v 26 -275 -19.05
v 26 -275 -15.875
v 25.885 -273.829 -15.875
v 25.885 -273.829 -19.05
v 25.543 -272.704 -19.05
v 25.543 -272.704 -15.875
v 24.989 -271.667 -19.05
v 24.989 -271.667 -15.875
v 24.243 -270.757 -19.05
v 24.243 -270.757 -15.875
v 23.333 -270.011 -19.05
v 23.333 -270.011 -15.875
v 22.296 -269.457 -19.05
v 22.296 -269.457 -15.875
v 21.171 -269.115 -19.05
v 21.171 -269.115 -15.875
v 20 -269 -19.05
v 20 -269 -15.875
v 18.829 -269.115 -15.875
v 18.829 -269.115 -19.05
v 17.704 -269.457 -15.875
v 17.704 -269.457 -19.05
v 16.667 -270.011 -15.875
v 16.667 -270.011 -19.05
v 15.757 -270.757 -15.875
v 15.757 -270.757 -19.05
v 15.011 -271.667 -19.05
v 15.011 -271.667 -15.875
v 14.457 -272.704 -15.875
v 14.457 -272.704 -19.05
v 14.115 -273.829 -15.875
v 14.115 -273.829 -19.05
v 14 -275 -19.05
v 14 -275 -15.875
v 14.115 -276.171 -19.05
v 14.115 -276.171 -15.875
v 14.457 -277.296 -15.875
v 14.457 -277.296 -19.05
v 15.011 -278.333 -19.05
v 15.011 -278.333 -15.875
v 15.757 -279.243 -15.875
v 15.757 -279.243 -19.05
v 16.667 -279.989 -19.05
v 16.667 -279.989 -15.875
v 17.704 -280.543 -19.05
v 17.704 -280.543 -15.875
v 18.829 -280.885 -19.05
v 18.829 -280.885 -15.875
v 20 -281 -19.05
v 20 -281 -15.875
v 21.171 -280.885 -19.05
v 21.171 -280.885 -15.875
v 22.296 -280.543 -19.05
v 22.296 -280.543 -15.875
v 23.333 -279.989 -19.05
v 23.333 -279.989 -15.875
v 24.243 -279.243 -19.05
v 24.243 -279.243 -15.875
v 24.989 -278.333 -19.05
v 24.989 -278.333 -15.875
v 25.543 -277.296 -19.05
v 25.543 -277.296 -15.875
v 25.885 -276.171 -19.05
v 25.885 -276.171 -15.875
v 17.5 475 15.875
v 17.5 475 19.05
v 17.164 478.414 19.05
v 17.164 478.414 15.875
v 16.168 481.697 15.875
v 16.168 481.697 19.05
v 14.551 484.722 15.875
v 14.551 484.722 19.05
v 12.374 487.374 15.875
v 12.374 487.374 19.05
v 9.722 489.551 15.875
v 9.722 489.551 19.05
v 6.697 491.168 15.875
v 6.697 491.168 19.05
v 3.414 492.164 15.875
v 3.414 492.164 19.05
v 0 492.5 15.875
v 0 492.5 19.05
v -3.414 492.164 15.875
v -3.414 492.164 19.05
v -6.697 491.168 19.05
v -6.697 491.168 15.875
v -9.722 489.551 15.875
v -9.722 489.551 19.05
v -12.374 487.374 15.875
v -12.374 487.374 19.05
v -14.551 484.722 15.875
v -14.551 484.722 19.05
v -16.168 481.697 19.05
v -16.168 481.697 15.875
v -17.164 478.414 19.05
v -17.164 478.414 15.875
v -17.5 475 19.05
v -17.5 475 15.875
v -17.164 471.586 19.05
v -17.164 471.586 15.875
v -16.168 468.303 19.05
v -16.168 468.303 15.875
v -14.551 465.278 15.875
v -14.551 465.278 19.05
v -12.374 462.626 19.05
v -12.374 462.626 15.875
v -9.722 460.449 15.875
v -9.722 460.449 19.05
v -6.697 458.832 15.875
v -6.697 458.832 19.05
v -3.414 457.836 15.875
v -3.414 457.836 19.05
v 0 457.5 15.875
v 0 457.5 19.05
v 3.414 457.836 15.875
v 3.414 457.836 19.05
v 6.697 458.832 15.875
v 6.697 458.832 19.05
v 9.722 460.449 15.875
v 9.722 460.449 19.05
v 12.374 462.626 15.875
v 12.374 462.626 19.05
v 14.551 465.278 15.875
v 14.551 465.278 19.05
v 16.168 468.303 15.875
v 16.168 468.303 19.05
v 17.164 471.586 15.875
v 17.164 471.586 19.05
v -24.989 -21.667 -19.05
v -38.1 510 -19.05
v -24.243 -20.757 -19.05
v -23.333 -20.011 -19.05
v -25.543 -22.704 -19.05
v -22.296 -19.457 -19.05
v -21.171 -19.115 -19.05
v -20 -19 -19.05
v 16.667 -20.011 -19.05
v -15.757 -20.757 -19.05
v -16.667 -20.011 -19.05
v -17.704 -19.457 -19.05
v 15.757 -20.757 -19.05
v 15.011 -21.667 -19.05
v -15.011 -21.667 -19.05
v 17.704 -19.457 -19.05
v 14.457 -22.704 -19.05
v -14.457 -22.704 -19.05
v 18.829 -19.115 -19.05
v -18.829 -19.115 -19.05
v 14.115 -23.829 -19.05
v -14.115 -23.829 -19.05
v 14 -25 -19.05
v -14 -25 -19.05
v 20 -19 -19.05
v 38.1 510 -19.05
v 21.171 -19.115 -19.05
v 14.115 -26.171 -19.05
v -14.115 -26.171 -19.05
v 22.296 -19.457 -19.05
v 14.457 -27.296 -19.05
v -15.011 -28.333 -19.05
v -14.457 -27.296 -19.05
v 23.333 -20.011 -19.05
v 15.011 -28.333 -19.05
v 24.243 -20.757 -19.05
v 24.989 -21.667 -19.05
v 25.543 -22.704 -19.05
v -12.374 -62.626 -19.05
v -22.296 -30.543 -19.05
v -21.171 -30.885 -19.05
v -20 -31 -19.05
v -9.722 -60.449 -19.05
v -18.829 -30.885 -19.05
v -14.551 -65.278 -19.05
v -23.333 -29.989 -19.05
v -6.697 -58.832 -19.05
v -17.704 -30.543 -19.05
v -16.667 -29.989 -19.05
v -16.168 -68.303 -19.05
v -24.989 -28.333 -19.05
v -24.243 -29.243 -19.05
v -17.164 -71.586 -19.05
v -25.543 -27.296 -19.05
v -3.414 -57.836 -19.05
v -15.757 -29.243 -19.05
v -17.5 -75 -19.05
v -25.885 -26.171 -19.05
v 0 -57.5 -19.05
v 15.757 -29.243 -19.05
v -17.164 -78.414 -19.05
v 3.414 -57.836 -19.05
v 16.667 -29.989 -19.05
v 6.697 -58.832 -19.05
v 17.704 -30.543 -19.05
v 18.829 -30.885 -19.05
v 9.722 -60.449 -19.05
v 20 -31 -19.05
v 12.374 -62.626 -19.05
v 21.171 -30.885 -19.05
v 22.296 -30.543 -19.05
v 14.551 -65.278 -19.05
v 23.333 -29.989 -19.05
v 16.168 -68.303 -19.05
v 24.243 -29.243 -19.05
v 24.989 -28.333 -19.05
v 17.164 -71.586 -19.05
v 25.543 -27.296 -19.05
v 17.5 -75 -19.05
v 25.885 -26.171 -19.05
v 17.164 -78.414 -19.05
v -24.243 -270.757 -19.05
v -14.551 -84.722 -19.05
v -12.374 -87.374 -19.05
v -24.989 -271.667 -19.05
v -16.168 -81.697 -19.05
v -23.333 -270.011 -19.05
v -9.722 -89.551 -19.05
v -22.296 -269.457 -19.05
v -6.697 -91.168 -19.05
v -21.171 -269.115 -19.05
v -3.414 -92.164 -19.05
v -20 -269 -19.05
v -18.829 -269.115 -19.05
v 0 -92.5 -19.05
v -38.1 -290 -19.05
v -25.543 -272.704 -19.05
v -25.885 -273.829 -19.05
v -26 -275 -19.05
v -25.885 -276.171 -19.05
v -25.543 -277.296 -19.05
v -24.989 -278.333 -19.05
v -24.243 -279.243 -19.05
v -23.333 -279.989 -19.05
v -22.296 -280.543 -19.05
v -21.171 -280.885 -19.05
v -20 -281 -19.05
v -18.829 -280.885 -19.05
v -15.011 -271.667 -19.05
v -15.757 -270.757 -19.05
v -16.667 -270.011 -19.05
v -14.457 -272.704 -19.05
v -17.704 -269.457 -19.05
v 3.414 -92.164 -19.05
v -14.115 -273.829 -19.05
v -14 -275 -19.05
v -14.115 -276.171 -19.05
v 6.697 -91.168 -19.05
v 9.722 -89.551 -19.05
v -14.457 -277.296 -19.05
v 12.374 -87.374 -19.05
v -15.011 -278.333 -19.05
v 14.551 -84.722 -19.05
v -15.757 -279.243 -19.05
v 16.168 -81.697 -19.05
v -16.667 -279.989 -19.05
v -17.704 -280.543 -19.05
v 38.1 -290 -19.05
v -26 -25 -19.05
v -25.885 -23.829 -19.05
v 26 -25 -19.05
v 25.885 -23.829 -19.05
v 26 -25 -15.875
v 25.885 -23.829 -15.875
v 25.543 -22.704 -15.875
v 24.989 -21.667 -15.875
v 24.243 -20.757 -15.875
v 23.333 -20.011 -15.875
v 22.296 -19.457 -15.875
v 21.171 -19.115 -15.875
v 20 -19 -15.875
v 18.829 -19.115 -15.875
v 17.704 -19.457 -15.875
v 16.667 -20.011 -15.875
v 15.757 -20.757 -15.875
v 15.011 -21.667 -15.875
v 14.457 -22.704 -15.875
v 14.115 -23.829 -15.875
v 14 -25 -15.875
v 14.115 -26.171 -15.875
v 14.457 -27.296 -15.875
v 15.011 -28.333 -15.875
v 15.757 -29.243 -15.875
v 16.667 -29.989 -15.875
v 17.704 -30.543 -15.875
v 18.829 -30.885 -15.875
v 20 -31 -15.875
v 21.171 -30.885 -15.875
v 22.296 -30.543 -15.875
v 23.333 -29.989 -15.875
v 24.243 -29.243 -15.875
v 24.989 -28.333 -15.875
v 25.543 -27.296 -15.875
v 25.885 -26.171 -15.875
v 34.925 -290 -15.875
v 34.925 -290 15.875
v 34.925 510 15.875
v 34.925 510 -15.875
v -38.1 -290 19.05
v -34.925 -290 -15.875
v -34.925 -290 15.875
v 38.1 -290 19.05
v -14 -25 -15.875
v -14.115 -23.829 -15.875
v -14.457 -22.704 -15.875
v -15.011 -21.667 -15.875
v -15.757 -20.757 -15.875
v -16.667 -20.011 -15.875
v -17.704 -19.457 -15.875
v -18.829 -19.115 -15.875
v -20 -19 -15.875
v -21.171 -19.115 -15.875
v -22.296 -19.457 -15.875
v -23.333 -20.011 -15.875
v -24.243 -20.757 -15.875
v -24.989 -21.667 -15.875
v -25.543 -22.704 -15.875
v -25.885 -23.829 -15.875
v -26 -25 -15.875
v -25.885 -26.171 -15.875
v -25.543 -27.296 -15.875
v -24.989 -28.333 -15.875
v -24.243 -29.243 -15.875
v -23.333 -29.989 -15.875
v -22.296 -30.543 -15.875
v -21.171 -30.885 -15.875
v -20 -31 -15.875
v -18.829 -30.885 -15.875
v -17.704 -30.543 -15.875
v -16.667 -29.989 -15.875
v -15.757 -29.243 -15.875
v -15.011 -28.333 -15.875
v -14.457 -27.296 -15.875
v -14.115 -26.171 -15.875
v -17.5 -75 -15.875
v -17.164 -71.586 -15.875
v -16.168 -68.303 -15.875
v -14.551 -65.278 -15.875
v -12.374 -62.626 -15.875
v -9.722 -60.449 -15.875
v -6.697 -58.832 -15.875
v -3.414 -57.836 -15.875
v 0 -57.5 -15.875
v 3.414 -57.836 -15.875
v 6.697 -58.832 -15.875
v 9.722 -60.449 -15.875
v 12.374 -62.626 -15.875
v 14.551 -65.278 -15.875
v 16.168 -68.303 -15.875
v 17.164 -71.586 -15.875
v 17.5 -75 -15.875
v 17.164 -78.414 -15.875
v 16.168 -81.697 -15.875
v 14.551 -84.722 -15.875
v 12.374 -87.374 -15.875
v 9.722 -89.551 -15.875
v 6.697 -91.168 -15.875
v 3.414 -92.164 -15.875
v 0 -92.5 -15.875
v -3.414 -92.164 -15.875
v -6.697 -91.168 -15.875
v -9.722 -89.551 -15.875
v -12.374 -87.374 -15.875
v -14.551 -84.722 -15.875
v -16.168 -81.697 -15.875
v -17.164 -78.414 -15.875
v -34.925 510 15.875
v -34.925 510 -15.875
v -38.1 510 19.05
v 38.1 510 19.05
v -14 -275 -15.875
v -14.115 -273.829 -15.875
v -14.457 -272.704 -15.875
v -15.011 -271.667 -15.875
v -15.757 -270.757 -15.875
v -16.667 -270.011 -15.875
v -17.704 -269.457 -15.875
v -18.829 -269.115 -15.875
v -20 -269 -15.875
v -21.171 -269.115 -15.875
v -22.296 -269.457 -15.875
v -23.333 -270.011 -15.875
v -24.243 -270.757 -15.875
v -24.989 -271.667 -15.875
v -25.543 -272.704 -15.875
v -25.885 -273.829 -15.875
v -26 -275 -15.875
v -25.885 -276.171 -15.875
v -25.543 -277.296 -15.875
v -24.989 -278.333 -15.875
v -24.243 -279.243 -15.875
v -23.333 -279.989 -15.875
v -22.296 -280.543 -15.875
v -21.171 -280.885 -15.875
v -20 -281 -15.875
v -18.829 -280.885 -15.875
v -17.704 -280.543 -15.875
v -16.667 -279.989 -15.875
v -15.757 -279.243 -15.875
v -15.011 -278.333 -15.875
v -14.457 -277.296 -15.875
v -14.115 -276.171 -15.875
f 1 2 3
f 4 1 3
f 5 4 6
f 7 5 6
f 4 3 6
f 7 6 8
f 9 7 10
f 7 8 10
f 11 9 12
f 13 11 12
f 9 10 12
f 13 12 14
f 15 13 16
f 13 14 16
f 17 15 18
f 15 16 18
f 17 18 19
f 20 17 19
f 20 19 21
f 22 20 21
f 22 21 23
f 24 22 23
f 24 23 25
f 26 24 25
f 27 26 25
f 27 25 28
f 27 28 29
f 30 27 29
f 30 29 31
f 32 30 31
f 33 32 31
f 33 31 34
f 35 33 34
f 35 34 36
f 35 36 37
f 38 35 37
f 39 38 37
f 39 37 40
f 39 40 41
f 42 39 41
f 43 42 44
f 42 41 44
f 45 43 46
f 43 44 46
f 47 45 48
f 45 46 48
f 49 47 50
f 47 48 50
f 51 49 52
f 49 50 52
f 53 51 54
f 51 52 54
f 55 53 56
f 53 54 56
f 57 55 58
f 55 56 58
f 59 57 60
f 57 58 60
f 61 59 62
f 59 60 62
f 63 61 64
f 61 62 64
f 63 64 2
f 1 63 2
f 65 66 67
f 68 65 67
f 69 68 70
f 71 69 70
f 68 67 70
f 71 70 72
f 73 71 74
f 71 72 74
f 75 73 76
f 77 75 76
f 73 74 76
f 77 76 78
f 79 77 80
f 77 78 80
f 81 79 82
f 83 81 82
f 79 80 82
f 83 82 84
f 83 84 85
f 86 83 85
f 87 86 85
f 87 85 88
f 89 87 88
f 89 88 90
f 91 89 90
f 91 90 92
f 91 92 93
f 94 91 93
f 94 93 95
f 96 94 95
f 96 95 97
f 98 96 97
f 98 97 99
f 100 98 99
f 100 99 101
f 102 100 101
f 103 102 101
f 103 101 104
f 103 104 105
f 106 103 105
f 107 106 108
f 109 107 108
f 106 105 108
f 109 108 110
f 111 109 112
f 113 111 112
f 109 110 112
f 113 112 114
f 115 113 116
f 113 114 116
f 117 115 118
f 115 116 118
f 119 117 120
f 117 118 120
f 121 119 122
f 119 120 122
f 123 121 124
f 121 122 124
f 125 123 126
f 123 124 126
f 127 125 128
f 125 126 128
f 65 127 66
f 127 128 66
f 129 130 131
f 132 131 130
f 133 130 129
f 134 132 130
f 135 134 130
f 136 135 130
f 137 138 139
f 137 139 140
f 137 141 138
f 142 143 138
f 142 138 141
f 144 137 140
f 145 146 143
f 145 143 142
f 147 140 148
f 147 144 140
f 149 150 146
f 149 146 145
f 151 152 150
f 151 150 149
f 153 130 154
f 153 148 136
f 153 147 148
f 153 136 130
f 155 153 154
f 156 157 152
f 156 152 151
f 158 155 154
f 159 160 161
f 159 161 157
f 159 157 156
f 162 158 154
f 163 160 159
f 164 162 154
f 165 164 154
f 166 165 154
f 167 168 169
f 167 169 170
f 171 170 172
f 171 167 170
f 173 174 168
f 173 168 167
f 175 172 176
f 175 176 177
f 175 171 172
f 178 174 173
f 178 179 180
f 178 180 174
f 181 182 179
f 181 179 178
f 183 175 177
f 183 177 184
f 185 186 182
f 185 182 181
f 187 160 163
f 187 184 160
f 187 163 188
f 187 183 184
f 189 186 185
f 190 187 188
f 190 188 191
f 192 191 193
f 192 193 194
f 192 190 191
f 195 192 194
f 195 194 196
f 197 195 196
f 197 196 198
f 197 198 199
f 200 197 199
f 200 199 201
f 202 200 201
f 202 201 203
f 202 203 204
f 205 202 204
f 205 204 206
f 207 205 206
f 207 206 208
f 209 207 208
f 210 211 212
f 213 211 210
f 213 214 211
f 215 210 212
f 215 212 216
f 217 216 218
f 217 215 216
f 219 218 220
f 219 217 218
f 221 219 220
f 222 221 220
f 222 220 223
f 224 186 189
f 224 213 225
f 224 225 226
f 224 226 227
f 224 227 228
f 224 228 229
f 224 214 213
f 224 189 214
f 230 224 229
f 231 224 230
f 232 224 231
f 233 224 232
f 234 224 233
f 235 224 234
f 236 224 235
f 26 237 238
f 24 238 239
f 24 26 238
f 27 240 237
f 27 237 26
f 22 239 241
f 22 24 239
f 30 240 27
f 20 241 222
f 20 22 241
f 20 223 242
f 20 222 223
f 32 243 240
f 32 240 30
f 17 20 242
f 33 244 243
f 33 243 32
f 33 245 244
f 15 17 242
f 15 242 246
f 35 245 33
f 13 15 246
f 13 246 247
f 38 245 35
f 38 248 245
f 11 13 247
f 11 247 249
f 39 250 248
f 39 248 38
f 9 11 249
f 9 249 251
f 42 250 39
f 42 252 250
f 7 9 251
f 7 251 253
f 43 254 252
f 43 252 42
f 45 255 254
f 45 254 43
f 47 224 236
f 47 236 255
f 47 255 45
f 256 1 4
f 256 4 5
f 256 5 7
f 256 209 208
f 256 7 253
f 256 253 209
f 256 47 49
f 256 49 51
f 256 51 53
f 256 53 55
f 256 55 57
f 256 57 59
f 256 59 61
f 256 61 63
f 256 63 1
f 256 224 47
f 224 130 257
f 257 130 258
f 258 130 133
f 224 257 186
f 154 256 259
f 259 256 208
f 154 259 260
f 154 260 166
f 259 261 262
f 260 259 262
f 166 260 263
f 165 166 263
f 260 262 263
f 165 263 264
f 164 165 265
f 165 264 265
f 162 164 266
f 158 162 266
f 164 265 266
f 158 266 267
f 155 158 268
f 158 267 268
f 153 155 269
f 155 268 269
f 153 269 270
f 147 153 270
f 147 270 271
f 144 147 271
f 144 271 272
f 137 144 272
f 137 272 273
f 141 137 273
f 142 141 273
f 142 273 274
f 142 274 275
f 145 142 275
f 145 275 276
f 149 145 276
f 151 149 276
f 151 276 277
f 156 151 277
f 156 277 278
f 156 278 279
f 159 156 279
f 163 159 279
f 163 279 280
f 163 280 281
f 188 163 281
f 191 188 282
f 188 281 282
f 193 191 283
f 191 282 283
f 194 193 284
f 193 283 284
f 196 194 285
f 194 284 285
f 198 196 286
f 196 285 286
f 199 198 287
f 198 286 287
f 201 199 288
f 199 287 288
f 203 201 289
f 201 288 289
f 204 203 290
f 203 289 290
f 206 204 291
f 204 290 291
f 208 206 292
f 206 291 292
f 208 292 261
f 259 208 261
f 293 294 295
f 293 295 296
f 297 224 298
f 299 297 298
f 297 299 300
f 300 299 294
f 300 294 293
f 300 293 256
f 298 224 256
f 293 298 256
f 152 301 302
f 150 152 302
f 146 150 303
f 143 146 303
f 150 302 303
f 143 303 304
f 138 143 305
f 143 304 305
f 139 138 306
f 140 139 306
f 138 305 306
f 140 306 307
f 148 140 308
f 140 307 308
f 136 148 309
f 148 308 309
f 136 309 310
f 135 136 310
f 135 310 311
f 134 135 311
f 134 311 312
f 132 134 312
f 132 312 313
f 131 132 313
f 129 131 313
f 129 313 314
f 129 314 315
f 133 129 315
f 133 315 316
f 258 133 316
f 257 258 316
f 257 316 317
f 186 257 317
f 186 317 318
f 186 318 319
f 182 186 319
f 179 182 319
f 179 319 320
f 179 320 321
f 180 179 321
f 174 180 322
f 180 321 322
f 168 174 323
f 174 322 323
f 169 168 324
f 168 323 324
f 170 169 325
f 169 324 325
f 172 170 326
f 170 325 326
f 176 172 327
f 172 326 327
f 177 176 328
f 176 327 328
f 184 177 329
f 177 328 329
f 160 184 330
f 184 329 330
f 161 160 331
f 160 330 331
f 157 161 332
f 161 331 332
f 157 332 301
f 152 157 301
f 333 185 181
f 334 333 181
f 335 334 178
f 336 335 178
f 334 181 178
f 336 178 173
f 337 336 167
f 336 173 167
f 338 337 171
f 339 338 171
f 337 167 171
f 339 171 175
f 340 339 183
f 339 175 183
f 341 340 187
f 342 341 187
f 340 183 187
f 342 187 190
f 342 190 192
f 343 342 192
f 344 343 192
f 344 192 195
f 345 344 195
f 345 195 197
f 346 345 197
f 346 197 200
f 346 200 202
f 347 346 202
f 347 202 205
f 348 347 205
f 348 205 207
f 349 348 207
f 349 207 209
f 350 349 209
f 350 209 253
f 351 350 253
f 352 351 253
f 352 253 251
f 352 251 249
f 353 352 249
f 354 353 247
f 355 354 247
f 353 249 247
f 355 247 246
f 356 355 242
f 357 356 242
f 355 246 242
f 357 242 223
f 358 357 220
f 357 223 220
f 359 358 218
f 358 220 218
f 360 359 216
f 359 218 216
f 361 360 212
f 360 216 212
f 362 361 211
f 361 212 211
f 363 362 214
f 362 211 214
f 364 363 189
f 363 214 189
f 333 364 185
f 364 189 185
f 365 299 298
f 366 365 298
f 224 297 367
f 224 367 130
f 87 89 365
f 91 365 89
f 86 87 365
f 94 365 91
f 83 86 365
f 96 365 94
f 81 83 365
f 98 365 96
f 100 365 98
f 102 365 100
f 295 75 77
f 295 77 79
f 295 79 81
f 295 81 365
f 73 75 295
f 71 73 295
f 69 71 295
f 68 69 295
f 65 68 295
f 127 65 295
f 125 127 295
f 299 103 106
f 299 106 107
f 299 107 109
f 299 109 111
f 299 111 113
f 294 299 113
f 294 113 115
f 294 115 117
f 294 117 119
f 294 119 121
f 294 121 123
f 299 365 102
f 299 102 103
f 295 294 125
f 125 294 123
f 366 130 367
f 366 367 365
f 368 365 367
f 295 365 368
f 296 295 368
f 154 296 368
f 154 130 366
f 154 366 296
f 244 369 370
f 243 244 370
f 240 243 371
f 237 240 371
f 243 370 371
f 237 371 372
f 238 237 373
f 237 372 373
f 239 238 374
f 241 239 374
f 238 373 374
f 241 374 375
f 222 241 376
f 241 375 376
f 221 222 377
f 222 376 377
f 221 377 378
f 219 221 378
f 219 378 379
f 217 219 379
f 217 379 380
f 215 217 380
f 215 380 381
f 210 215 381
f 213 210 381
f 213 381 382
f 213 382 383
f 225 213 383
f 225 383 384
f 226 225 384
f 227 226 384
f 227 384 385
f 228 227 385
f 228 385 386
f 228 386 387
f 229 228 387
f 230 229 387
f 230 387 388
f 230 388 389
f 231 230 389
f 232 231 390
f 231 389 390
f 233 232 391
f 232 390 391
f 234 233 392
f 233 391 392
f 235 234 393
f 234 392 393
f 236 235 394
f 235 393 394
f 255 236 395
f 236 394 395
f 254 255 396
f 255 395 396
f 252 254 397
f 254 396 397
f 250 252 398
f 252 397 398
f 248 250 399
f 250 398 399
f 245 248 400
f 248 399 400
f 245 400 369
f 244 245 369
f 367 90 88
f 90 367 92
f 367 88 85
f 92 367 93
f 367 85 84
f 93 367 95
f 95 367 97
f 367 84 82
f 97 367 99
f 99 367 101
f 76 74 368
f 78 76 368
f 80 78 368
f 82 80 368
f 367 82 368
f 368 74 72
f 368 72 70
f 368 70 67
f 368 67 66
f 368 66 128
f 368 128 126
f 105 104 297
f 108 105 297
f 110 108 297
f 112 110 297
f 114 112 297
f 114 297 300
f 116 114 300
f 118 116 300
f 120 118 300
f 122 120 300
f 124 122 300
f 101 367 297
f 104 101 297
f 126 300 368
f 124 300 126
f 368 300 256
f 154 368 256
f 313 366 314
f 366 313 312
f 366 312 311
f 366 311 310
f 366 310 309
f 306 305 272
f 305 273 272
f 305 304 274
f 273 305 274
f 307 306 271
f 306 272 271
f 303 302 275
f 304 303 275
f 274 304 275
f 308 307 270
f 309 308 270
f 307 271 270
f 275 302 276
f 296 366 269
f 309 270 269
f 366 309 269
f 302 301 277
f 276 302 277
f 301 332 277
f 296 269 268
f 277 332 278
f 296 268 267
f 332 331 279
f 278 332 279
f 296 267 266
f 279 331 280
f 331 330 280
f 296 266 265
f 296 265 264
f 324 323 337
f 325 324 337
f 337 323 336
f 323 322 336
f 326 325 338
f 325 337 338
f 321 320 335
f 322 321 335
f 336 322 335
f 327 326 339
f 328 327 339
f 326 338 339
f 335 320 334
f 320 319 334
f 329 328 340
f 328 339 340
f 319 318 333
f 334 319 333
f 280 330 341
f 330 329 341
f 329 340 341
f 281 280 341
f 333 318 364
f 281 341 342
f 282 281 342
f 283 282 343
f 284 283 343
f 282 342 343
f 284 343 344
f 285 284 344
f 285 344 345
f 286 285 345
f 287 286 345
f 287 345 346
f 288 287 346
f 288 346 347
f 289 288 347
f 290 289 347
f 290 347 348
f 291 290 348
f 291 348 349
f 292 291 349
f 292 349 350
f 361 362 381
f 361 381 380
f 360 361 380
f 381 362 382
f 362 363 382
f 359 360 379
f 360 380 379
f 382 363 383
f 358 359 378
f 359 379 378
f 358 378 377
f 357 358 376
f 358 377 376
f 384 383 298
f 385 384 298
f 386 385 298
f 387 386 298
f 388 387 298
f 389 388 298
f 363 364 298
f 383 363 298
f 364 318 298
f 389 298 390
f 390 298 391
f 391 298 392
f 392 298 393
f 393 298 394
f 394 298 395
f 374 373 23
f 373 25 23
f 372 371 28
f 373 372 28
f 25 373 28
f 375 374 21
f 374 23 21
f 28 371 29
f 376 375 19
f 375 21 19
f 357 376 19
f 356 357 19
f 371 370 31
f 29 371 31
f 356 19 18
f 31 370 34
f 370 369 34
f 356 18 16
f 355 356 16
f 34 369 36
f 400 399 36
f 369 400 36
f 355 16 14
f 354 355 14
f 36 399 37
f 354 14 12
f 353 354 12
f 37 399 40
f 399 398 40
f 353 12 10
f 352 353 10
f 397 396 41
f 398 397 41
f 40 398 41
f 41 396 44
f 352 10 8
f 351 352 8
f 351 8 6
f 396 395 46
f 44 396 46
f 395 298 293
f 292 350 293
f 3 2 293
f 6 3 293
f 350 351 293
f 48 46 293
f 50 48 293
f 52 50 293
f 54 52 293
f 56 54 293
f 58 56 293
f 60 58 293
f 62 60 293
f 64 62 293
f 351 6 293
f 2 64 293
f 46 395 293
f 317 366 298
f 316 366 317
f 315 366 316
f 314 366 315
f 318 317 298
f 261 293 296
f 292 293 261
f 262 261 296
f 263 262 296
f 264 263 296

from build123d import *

# Parameters (mm, degrees)
EXTRUDE_THIN1_DEPTH            = 510
EXTRUDE_THIN1_DEPTH_BACK       = 290
SKETCH1_W                      = 76.2
SKETCH1_H                      = 38.1
SKETCH1_W_2                    = 69.85
SKETCH1_H_2                    = 31.75
F_12_0_12_DIAMETER_HOLE1_D     = 12
F_12_0_12_DIAMETER_HOLE1_DEPTH = 3.175
CUT_EXTRUDE1_REACH             = 514.838
SKETCH6_R                      = 17.5
CUT_EXTRUDE2_REACH             = 514.838
SKETCH7_R                      = 17.5


with BuildPart() as part:
    # Sketch1 → Extrude-Thin1 (new, two sides: drawn at the far end of the back side and taken through both)
    with BuildSketch(Plane(origin=(0, 0, 0), x_dir=(1, 0, 0), z_dir=(0, 1, 0)).offset(-EXTRUDE_THIN1_DEPTH_BACK)):
        Rectangle(SKETCH1_W, SKETCH1_H)
        Rectangle(SKETCH1_W_2, SKETCH1_H_2, mode=Mode.SUBTRACT)
    extrude(amount=EXTRUDE_THIN1_DEPTH + EXTRUDE_THIN1_DEPTH_BACK)

    # Ø12.0 (12) Diameter Hole1
    with Locations(Plane(origin=(0, 0, -19.05), x_dir=(-1, 0, 0), z_dir=(0, 0, -1))):
        with Locations((-20, -25), (20, -275), (-20, -275), (20, -25)):
            Hole(F_12_0_12_DIAMETER_HOLE1_D / 2, depth=F_12_0_12_DIAMETER_HOLE1_DEPTH)

    # Sketch6 → Cut-Extrude1 (cut, up to next)
    with BuildSketch(Plane.XY.offset(19.05), mode=Mode.PRIVATE) as cut_extrude1_sk1:
        with Locations((0, 475)):
            Circle(SKETCH6_R)
    cut_extrude1_tool1 = extrude(cut_extrude1_sk1.sketch, amount=-CUT_EXTRUDE1_REACH, mode=Mode.PRIVATE) & part.part
    add(cut_extrude1_tool1.solids().sort_by_distance((0, 475, 19.05))[0], mode=Mode.SUBTRACT)

    # Sketch7 → Cut-Extrude2 (cut, up to next)
    with BuildSketch(Plane(origin=(0, 0, -19.05), x_dir=(-1, 0, 0), z_dir=(0, 0, -1)), mode=Mode.PRIVATE) as cut_extrude2_sk1:
        with Locations((0, -75)):
            Circle(SKETCH7_R)
    cut_extrude2_tool1 = extrude(cut_extrude2_sk1.sketch, amount=-CUT_EXTRUDE2_REACH, mode=Mode.PRIVATE) & part.part
    add(cut_extrude2_tool1.solids().sort_by_distance((0, -75, -19.05))[0], mode=Mode.SUBTRACT)


solid = part.part
